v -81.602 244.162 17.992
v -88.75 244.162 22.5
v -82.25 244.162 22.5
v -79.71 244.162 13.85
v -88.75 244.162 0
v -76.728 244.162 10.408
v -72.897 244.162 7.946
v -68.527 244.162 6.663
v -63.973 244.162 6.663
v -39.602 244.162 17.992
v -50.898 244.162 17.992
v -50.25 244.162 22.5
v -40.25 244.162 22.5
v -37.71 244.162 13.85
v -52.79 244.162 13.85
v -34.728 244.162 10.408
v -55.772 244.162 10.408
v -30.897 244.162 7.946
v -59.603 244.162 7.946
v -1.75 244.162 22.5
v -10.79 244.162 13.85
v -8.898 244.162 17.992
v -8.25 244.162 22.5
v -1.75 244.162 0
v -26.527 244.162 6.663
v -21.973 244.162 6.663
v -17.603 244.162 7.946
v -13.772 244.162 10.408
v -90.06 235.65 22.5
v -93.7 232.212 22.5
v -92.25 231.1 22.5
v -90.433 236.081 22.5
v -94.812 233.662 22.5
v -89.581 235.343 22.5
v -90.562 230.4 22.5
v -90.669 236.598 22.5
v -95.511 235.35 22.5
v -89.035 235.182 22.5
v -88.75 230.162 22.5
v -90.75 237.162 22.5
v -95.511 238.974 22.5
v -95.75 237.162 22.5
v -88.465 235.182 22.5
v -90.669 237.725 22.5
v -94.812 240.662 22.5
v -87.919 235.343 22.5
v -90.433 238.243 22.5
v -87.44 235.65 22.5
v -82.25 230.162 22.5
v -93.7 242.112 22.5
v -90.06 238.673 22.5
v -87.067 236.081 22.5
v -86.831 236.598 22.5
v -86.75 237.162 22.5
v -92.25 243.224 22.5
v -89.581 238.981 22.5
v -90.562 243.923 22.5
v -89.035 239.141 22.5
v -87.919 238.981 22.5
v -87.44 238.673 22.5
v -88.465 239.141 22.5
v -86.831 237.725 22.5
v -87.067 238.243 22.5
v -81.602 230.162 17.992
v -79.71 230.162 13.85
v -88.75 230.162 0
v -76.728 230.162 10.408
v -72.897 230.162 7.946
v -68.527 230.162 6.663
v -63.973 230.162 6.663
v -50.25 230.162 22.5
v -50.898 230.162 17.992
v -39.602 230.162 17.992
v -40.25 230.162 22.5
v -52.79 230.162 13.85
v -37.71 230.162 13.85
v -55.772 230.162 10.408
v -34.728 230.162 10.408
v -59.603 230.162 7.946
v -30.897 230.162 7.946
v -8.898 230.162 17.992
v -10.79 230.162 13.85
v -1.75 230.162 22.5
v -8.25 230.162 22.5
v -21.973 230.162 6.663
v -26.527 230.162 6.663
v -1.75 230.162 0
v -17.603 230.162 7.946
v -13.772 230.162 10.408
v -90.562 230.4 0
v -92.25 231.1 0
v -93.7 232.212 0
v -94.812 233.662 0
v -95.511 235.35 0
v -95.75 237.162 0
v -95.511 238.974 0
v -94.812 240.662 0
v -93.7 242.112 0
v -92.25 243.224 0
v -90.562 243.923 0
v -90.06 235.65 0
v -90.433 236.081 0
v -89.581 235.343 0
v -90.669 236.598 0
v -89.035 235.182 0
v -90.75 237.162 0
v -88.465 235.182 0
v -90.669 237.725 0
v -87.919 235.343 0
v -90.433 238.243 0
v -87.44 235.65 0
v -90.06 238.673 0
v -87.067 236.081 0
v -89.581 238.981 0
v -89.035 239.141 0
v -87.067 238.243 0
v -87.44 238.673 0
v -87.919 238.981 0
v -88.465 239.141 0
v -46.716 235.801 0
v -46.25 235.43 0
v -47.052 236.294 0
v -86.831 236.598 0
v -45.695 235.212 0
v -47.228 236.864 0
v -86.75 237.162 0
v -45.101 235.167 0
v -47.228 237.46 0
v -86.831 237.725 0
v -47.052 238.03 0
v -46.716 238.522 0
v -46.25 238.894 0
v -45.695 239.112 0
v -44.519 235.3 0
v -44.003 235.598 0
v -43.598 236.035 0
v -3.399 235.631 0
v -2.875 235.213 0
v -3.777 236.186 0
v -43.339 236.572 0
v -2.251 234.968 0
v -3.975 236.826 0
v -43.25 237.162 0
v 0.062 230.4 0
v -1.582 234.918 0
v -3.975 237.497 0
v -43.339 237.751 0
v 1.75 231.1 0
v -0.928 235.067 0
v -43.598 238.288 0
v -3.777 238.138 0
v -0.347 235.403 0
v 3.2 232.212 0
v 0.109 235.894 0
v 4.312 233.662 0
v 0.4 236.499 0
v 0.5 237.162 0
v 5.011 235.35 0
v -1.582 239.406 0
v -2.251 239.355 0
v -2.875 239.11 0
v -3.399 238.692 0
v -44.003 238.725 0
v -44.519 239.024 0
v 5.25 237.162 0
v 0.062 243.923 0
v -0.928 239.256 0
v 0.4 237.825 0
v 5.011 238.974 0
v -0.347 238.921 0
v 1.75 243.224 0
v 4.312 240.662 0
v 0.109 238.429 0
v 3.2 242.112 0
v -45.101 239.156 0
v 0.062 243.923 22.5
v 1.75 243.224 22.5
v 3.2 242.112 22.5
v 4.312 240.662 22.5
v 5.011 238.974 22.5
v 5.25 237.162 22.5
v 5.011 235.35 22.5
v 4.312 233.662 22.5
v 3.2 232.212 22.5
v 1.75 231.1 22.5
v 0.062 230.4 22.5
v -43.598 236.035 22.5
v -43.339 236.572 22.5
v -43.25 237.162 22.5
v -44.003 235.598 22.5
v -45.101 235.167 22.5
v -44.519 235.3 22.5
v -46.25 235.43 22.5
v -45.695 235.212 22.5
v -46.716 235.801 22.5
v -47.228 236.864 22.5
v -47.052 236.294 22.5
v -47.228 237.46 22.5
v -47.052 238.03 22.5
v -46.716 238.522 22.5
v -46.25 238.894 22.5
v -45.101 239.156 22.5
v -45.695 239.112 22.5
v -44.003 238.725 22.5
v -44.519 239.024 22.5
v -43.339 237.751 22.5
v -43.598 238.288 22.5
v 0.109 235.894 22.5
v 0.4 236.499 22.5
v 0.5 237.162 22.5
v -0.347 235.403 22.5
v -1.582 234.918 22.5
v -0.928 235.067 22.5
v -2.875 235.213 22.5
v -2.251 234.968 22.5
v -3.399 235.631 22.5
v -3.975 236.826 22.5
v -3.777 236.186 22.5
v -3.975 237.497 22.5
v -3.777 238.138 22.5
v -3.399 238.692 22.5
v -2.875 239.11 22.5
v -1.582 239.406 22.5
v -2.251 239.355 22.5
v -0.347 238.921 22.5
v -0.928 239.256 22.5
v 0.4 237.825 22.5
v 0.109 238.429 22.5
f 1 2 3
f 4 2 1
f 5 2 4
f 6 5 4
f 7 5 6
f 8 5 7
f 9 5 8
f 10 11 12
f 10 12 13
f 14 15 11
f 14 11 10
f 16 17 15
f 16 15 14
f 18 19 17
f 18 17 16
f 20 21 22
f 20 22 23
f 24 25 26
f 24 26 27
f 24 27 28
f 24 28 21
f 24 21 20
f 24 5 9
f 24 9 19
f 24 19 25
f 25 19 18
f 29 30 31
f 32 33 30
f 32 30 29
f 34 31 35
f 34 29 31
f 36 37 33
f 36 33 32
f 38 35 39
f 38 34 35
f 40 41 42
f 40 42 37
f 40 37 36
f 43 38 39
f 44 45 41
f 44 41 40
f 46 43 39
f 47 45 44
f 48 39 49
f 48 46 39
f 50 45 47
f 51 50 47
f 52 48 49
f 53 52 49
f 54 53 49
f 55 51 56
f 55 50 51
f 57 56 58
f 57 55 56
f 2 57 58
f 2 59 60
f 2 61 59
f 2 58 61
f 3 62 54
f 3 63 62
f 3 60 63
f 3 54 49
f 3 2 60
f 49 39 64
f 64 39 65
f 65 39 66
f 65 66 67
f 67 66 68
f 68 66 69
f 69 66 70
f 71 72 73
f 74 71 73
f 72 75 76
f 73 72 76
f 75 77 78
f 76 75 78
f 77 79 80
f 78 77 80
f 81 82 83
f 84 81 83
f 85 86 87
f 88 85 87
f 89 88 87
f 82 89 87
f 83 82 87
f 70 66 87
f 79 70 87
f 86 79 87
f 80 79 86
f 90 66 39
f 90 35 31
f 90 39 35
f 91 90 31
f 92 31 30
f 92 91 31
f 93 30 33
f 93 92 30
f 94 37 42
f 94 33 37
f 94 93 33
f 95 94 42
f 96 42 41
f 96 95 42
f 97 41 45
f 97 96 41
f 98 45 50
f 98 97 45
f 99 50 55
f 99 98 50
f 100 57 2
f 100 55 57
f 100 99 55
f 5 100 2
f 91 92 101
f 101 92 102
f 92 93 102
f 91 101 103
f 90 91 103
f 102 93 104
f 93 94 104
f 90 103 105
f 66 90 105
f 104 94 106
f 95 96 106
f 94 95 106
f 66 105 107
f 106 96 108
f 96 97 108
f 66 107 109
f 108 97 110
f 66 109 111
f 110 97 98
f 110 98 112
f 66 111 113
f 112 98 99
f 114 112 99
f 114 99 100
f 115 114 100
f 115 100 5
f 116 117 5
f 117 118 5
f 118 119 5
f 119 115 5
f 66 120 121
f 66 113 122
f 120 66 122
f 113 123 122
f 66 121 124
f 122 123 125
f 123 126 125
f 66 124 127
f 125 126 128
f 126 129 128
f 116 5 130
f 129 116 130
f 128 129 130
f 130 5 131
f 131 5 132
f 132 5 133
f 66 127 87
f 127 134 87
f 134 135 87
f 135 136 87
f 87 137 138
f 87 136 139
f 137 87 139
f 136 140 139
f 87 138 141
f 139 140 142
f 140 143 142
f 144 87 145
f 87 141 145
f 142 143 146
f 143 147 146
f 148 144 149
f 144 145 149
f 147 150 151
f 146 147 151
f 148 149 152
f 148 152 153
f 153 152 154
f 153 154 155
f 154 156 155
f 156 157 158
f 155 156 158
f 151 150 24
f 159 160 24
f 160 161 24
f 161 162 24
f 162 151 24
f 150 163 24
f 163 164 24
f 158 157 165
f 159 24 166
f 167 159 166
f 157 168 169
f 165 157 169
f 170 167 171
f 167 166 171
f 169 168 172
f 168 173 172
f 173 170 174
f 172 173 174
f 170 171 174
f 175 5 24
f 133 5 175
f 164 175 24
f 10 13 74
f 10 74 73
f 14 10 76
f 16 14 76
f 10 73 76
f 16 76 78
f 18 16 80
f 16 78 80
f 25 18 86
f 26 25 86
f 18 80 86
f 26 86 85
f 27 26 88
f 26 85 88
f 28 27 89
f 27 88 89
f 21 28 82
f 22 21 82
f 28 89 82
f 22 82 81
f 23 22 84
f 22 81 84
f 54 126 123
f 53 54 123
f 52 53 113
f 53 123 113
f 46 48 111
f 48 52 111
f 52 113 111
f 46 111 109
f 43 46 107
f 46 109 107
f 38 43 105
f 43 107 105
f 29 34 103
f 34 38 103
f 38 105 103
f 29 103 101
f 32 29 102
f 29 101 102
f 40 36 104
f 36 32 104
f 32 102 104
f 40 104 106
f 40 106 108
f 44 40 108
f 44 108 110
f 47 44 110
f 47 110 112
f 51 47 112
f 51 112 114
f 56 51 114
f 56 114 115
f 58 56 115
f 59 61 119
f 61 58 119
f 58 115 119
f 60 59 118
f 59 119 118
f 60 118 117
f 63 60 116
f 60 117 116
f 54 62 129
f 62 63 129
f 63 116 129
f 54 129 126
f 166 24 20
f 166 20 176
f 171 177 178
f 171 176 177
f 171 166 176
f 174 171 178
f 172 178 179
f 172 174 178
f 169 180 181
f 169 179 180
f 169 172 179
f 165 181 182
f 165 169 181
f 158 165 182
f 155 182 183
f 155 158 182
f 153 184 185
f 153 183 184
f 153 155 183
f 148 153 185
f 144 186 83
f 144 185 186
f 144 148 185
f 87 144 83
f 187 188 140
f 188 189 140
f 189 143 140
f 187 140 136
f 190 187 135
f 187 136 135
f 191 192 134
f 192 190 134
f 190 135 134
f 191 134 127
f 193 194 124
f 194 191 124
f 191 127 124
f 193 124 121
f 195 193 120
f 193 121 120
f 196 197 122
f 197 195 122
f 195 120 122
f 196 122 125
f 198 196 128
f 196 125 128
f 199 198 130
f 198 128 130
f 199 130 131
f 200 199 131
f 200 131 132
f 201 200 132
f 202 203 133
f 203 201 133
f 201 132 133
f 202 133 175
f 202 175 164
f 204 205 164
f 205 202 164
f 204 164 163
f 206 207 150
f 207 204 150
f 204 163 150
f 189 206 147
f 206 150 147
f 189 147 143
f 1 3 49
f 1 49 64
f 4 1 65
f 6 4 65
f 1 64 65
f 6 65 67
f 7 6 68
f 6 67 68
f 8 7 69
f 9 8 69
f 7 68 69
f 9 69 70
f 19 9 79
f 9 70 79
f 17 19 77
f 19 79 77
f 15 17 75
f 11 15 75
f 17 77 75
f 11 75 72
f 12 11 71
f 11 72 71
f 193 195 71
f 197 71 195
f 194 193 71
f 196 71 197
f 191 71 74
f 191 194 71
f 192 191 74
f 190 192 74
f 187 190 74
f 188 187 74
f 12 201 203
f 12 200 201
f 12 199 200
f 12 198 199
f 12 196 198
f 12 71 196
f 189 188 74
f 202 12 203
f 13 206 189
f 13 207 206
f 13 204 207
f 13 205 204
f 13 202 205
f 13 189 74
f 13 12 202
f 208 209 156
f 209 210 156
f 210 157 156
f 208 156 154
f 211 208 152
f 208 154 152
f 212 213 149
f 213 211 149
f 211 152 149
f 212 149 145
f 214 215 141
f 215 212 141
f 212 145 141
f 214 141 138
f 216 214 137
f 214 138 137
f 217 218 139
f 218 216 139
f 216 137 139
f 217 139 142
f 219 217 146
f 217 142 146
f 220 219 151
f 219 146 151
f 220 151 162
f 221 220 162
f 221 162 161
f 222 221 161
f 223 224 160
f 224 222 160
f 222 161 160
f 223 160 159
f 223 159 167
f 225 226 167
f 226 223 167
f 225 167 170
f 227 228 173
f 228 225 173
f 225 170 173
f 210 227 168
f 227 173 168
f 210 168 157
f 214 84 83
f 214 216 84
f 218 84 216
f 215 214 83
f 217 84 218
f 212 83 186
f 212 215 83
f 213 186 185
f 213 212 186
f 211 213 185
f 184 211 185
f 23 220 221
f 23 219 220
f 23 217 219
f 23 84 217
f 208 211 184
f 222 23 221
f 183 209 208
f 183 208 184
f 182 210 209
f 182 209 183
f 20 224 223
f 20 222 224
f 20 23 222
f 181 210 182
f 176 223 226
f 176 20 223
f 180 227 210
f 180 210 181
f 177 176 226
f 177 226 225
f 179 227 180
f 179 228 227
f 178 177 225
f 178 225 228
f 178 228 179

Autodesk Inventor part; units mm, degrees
ref_plane "YZ Plane" through (0, 0, 0) normal (1, 0, 0) x (0, 1, 0)
ref_plane "XZ Plane" through (0, 0, 0) normal (0, 1, 0) x (-1, 0, 0)
sketch "Sketch1" plane through (0, 0, 0) normal (0, 0, 1) x (1, 0, 0)
  circle A0 centre (-88.75, 237.1618) radius 2 projected
  circle A1 centre (-45.25, 302.7734) radius 2 projected
  circle A2 centre (-88.75, 302.7734) radius 2 projected
  circle A3 centre (-45.25, 237.1618) radius 2 projected
  circle A4 centre (-46.75, 361.06) radius 2 projected
  circle A5 centre (-40.75, 400) radius 23.3333 projected
  line L0 (-53.25, 186.7791) -> (-53.25, -39) projected
  arc A6 (-53.25, -39) -> (-46.25, -46) centre (-46.25, -39) ccw projected
  line L1 (1.25, -46) -> (-46.25, -46) projected
  arc A7 (1.25, -46) -> (8.9167, 45.3566) centre (1.25, 0) ccw projected
  arc A8 (7.25, 47.3286) -> (8.9167, 45.3566) centre (9.25, 47.3286) ccw projected
  line L2 (7.25, 400) -> (7.25, 47.3286) projected
  arc A9 (7.25, 400) -> (-27.0387, 446) centre (-40.75, 400) ccw projected
  line L3 (-85.75, 446) -> (-27.0387, 446) projected
  circle A10 centre (-85.75, 438.7) radius 2 projected
  circle A11 centre (-85.75, 361.06) radius 2 projected
  circle A12 centre (-46.75, 438.7) radius 2 projected
  circle A13 centre (10.9583, -29.879) radius 2.1 projected
  circle A14 centre (32.6667, 0) radius 2.1 projected
  circle A15 centre (-24.1666, -18.4663) radius 2.1 projected
  circle A16 centre (10.9583, 29.879) radius 2.1 projected
  circle A17 centre (-24.1666, 18.4663) radius 2.1 projected
  circle A18 centre (1.25, 0) radius 23.3333 projected
  circle A19 centre (-1.75, 302.7734) radius 2.25 projected
  circle A20 centre (-1.75, 237.1618) radius 2.25 projected
  circle A21 centre (-43.75, 127.6736) radius 2 projected
  circle A22 centre (-4.75, -38.7) radius 2 projected
  circle A23 centre (-4.75, 38.94) radius 2 projected
  circle A24 centre (-4.75, 127.6736) radius 2 projected
  circle A25 centre (-43.75, -38.7) radius 2 projected
  circle A26 centre (-43.75, 38.94) radius 2 projected
  line L4 (-88.75, 237.1618) -> (-95.75, 237.1618)
  line L5 (-1.75, 237.1618) -> (5.25, 237.1618)
  circle A27 centre (-88.75, 237.1618) radius 7
  circle A28 centre (-1.75, 237.1618) radius 7
  line L6 (-88.75, 230.1618) -> (-1.75, 230.1618)
  line L7 (-88.75, 244.1618) -> (-1.75, 244.1618)
  circle A29 centre (-9.3333, 400) radius 2.1 projected
  circle A30 centre (-31.0417, 429.879) radius 2.1 projected
  circle A31 centre (-31.0417, 370.121) radius 2.1 projected
  circle A32 centre (-66.1666, 418.4663) radius 2.1 projected
  circle A33 centre (-66.1666, 381.5337) radius 2.1 projected
  arc A34 (-95.75, 226.7791) -> (-85.75, 216.7791) centre (-85.75, 226.7791) ccw projected
  line L8 (-85.75, 216.7791) -> (-83.25, 216.7791) projected
  arc A35 (-53.25, 186.7791) -> (-83.25, 216.7791) centre (-83.25, 186.7791) ccw projected
  arc A36 (-85.75, 446) -> (-95.75, 436) centre (-85.75, 436) ccw projected
  line L9 (-95.75, 226.7791) -> (-95.75, 436) projected
  point P0 (0, 0)
  dimension "d0" = 7
  dimension "d1" = 7
ref_plane "Work Plane1" through (-48.25, 120.3736, 22.5) normal (0, 0, -1) x (0, 1, 0)
extrude "Extrusion1" add sketch "Sketch1" along normal up to surface (22.5 mm away) contours A27 | L7 A28 L6 A27 | A28
sketch "Sketch2" plane through (-88.75, 230.1618, 0) normal (0, -1, 0) x (1, 0, 0)
  circle A0 centre (22.5, 22.5) radius 16 projected
  circle A1 centre (64.5, 22.5) radius 16 projected
  line L0 (0, 22.5) -> (87, 22.5) projected
  line L1 (0, 0) -> (0, 22.5) projected
  line L2 (0, 0) -> (87, 0) projected
  line L3 (87, 0) -> (87, 22.5) projected
  point P0 (88.75, 0)
  point P1 (80.5, 22.5)
  point P2 (48.5, 22.5)
  point P3 (38.5, 22.5)
  point P4 (6.5, 22.5)
extrude "Extrusion2" cut sketch "Sketch2" against normal through all contours A0 L0 | L0 A1 picked at (22.9879, 15.9292) picked at (60.5079, 16.4106)
properties part number "Uchwyt_silnika_podwojny"
